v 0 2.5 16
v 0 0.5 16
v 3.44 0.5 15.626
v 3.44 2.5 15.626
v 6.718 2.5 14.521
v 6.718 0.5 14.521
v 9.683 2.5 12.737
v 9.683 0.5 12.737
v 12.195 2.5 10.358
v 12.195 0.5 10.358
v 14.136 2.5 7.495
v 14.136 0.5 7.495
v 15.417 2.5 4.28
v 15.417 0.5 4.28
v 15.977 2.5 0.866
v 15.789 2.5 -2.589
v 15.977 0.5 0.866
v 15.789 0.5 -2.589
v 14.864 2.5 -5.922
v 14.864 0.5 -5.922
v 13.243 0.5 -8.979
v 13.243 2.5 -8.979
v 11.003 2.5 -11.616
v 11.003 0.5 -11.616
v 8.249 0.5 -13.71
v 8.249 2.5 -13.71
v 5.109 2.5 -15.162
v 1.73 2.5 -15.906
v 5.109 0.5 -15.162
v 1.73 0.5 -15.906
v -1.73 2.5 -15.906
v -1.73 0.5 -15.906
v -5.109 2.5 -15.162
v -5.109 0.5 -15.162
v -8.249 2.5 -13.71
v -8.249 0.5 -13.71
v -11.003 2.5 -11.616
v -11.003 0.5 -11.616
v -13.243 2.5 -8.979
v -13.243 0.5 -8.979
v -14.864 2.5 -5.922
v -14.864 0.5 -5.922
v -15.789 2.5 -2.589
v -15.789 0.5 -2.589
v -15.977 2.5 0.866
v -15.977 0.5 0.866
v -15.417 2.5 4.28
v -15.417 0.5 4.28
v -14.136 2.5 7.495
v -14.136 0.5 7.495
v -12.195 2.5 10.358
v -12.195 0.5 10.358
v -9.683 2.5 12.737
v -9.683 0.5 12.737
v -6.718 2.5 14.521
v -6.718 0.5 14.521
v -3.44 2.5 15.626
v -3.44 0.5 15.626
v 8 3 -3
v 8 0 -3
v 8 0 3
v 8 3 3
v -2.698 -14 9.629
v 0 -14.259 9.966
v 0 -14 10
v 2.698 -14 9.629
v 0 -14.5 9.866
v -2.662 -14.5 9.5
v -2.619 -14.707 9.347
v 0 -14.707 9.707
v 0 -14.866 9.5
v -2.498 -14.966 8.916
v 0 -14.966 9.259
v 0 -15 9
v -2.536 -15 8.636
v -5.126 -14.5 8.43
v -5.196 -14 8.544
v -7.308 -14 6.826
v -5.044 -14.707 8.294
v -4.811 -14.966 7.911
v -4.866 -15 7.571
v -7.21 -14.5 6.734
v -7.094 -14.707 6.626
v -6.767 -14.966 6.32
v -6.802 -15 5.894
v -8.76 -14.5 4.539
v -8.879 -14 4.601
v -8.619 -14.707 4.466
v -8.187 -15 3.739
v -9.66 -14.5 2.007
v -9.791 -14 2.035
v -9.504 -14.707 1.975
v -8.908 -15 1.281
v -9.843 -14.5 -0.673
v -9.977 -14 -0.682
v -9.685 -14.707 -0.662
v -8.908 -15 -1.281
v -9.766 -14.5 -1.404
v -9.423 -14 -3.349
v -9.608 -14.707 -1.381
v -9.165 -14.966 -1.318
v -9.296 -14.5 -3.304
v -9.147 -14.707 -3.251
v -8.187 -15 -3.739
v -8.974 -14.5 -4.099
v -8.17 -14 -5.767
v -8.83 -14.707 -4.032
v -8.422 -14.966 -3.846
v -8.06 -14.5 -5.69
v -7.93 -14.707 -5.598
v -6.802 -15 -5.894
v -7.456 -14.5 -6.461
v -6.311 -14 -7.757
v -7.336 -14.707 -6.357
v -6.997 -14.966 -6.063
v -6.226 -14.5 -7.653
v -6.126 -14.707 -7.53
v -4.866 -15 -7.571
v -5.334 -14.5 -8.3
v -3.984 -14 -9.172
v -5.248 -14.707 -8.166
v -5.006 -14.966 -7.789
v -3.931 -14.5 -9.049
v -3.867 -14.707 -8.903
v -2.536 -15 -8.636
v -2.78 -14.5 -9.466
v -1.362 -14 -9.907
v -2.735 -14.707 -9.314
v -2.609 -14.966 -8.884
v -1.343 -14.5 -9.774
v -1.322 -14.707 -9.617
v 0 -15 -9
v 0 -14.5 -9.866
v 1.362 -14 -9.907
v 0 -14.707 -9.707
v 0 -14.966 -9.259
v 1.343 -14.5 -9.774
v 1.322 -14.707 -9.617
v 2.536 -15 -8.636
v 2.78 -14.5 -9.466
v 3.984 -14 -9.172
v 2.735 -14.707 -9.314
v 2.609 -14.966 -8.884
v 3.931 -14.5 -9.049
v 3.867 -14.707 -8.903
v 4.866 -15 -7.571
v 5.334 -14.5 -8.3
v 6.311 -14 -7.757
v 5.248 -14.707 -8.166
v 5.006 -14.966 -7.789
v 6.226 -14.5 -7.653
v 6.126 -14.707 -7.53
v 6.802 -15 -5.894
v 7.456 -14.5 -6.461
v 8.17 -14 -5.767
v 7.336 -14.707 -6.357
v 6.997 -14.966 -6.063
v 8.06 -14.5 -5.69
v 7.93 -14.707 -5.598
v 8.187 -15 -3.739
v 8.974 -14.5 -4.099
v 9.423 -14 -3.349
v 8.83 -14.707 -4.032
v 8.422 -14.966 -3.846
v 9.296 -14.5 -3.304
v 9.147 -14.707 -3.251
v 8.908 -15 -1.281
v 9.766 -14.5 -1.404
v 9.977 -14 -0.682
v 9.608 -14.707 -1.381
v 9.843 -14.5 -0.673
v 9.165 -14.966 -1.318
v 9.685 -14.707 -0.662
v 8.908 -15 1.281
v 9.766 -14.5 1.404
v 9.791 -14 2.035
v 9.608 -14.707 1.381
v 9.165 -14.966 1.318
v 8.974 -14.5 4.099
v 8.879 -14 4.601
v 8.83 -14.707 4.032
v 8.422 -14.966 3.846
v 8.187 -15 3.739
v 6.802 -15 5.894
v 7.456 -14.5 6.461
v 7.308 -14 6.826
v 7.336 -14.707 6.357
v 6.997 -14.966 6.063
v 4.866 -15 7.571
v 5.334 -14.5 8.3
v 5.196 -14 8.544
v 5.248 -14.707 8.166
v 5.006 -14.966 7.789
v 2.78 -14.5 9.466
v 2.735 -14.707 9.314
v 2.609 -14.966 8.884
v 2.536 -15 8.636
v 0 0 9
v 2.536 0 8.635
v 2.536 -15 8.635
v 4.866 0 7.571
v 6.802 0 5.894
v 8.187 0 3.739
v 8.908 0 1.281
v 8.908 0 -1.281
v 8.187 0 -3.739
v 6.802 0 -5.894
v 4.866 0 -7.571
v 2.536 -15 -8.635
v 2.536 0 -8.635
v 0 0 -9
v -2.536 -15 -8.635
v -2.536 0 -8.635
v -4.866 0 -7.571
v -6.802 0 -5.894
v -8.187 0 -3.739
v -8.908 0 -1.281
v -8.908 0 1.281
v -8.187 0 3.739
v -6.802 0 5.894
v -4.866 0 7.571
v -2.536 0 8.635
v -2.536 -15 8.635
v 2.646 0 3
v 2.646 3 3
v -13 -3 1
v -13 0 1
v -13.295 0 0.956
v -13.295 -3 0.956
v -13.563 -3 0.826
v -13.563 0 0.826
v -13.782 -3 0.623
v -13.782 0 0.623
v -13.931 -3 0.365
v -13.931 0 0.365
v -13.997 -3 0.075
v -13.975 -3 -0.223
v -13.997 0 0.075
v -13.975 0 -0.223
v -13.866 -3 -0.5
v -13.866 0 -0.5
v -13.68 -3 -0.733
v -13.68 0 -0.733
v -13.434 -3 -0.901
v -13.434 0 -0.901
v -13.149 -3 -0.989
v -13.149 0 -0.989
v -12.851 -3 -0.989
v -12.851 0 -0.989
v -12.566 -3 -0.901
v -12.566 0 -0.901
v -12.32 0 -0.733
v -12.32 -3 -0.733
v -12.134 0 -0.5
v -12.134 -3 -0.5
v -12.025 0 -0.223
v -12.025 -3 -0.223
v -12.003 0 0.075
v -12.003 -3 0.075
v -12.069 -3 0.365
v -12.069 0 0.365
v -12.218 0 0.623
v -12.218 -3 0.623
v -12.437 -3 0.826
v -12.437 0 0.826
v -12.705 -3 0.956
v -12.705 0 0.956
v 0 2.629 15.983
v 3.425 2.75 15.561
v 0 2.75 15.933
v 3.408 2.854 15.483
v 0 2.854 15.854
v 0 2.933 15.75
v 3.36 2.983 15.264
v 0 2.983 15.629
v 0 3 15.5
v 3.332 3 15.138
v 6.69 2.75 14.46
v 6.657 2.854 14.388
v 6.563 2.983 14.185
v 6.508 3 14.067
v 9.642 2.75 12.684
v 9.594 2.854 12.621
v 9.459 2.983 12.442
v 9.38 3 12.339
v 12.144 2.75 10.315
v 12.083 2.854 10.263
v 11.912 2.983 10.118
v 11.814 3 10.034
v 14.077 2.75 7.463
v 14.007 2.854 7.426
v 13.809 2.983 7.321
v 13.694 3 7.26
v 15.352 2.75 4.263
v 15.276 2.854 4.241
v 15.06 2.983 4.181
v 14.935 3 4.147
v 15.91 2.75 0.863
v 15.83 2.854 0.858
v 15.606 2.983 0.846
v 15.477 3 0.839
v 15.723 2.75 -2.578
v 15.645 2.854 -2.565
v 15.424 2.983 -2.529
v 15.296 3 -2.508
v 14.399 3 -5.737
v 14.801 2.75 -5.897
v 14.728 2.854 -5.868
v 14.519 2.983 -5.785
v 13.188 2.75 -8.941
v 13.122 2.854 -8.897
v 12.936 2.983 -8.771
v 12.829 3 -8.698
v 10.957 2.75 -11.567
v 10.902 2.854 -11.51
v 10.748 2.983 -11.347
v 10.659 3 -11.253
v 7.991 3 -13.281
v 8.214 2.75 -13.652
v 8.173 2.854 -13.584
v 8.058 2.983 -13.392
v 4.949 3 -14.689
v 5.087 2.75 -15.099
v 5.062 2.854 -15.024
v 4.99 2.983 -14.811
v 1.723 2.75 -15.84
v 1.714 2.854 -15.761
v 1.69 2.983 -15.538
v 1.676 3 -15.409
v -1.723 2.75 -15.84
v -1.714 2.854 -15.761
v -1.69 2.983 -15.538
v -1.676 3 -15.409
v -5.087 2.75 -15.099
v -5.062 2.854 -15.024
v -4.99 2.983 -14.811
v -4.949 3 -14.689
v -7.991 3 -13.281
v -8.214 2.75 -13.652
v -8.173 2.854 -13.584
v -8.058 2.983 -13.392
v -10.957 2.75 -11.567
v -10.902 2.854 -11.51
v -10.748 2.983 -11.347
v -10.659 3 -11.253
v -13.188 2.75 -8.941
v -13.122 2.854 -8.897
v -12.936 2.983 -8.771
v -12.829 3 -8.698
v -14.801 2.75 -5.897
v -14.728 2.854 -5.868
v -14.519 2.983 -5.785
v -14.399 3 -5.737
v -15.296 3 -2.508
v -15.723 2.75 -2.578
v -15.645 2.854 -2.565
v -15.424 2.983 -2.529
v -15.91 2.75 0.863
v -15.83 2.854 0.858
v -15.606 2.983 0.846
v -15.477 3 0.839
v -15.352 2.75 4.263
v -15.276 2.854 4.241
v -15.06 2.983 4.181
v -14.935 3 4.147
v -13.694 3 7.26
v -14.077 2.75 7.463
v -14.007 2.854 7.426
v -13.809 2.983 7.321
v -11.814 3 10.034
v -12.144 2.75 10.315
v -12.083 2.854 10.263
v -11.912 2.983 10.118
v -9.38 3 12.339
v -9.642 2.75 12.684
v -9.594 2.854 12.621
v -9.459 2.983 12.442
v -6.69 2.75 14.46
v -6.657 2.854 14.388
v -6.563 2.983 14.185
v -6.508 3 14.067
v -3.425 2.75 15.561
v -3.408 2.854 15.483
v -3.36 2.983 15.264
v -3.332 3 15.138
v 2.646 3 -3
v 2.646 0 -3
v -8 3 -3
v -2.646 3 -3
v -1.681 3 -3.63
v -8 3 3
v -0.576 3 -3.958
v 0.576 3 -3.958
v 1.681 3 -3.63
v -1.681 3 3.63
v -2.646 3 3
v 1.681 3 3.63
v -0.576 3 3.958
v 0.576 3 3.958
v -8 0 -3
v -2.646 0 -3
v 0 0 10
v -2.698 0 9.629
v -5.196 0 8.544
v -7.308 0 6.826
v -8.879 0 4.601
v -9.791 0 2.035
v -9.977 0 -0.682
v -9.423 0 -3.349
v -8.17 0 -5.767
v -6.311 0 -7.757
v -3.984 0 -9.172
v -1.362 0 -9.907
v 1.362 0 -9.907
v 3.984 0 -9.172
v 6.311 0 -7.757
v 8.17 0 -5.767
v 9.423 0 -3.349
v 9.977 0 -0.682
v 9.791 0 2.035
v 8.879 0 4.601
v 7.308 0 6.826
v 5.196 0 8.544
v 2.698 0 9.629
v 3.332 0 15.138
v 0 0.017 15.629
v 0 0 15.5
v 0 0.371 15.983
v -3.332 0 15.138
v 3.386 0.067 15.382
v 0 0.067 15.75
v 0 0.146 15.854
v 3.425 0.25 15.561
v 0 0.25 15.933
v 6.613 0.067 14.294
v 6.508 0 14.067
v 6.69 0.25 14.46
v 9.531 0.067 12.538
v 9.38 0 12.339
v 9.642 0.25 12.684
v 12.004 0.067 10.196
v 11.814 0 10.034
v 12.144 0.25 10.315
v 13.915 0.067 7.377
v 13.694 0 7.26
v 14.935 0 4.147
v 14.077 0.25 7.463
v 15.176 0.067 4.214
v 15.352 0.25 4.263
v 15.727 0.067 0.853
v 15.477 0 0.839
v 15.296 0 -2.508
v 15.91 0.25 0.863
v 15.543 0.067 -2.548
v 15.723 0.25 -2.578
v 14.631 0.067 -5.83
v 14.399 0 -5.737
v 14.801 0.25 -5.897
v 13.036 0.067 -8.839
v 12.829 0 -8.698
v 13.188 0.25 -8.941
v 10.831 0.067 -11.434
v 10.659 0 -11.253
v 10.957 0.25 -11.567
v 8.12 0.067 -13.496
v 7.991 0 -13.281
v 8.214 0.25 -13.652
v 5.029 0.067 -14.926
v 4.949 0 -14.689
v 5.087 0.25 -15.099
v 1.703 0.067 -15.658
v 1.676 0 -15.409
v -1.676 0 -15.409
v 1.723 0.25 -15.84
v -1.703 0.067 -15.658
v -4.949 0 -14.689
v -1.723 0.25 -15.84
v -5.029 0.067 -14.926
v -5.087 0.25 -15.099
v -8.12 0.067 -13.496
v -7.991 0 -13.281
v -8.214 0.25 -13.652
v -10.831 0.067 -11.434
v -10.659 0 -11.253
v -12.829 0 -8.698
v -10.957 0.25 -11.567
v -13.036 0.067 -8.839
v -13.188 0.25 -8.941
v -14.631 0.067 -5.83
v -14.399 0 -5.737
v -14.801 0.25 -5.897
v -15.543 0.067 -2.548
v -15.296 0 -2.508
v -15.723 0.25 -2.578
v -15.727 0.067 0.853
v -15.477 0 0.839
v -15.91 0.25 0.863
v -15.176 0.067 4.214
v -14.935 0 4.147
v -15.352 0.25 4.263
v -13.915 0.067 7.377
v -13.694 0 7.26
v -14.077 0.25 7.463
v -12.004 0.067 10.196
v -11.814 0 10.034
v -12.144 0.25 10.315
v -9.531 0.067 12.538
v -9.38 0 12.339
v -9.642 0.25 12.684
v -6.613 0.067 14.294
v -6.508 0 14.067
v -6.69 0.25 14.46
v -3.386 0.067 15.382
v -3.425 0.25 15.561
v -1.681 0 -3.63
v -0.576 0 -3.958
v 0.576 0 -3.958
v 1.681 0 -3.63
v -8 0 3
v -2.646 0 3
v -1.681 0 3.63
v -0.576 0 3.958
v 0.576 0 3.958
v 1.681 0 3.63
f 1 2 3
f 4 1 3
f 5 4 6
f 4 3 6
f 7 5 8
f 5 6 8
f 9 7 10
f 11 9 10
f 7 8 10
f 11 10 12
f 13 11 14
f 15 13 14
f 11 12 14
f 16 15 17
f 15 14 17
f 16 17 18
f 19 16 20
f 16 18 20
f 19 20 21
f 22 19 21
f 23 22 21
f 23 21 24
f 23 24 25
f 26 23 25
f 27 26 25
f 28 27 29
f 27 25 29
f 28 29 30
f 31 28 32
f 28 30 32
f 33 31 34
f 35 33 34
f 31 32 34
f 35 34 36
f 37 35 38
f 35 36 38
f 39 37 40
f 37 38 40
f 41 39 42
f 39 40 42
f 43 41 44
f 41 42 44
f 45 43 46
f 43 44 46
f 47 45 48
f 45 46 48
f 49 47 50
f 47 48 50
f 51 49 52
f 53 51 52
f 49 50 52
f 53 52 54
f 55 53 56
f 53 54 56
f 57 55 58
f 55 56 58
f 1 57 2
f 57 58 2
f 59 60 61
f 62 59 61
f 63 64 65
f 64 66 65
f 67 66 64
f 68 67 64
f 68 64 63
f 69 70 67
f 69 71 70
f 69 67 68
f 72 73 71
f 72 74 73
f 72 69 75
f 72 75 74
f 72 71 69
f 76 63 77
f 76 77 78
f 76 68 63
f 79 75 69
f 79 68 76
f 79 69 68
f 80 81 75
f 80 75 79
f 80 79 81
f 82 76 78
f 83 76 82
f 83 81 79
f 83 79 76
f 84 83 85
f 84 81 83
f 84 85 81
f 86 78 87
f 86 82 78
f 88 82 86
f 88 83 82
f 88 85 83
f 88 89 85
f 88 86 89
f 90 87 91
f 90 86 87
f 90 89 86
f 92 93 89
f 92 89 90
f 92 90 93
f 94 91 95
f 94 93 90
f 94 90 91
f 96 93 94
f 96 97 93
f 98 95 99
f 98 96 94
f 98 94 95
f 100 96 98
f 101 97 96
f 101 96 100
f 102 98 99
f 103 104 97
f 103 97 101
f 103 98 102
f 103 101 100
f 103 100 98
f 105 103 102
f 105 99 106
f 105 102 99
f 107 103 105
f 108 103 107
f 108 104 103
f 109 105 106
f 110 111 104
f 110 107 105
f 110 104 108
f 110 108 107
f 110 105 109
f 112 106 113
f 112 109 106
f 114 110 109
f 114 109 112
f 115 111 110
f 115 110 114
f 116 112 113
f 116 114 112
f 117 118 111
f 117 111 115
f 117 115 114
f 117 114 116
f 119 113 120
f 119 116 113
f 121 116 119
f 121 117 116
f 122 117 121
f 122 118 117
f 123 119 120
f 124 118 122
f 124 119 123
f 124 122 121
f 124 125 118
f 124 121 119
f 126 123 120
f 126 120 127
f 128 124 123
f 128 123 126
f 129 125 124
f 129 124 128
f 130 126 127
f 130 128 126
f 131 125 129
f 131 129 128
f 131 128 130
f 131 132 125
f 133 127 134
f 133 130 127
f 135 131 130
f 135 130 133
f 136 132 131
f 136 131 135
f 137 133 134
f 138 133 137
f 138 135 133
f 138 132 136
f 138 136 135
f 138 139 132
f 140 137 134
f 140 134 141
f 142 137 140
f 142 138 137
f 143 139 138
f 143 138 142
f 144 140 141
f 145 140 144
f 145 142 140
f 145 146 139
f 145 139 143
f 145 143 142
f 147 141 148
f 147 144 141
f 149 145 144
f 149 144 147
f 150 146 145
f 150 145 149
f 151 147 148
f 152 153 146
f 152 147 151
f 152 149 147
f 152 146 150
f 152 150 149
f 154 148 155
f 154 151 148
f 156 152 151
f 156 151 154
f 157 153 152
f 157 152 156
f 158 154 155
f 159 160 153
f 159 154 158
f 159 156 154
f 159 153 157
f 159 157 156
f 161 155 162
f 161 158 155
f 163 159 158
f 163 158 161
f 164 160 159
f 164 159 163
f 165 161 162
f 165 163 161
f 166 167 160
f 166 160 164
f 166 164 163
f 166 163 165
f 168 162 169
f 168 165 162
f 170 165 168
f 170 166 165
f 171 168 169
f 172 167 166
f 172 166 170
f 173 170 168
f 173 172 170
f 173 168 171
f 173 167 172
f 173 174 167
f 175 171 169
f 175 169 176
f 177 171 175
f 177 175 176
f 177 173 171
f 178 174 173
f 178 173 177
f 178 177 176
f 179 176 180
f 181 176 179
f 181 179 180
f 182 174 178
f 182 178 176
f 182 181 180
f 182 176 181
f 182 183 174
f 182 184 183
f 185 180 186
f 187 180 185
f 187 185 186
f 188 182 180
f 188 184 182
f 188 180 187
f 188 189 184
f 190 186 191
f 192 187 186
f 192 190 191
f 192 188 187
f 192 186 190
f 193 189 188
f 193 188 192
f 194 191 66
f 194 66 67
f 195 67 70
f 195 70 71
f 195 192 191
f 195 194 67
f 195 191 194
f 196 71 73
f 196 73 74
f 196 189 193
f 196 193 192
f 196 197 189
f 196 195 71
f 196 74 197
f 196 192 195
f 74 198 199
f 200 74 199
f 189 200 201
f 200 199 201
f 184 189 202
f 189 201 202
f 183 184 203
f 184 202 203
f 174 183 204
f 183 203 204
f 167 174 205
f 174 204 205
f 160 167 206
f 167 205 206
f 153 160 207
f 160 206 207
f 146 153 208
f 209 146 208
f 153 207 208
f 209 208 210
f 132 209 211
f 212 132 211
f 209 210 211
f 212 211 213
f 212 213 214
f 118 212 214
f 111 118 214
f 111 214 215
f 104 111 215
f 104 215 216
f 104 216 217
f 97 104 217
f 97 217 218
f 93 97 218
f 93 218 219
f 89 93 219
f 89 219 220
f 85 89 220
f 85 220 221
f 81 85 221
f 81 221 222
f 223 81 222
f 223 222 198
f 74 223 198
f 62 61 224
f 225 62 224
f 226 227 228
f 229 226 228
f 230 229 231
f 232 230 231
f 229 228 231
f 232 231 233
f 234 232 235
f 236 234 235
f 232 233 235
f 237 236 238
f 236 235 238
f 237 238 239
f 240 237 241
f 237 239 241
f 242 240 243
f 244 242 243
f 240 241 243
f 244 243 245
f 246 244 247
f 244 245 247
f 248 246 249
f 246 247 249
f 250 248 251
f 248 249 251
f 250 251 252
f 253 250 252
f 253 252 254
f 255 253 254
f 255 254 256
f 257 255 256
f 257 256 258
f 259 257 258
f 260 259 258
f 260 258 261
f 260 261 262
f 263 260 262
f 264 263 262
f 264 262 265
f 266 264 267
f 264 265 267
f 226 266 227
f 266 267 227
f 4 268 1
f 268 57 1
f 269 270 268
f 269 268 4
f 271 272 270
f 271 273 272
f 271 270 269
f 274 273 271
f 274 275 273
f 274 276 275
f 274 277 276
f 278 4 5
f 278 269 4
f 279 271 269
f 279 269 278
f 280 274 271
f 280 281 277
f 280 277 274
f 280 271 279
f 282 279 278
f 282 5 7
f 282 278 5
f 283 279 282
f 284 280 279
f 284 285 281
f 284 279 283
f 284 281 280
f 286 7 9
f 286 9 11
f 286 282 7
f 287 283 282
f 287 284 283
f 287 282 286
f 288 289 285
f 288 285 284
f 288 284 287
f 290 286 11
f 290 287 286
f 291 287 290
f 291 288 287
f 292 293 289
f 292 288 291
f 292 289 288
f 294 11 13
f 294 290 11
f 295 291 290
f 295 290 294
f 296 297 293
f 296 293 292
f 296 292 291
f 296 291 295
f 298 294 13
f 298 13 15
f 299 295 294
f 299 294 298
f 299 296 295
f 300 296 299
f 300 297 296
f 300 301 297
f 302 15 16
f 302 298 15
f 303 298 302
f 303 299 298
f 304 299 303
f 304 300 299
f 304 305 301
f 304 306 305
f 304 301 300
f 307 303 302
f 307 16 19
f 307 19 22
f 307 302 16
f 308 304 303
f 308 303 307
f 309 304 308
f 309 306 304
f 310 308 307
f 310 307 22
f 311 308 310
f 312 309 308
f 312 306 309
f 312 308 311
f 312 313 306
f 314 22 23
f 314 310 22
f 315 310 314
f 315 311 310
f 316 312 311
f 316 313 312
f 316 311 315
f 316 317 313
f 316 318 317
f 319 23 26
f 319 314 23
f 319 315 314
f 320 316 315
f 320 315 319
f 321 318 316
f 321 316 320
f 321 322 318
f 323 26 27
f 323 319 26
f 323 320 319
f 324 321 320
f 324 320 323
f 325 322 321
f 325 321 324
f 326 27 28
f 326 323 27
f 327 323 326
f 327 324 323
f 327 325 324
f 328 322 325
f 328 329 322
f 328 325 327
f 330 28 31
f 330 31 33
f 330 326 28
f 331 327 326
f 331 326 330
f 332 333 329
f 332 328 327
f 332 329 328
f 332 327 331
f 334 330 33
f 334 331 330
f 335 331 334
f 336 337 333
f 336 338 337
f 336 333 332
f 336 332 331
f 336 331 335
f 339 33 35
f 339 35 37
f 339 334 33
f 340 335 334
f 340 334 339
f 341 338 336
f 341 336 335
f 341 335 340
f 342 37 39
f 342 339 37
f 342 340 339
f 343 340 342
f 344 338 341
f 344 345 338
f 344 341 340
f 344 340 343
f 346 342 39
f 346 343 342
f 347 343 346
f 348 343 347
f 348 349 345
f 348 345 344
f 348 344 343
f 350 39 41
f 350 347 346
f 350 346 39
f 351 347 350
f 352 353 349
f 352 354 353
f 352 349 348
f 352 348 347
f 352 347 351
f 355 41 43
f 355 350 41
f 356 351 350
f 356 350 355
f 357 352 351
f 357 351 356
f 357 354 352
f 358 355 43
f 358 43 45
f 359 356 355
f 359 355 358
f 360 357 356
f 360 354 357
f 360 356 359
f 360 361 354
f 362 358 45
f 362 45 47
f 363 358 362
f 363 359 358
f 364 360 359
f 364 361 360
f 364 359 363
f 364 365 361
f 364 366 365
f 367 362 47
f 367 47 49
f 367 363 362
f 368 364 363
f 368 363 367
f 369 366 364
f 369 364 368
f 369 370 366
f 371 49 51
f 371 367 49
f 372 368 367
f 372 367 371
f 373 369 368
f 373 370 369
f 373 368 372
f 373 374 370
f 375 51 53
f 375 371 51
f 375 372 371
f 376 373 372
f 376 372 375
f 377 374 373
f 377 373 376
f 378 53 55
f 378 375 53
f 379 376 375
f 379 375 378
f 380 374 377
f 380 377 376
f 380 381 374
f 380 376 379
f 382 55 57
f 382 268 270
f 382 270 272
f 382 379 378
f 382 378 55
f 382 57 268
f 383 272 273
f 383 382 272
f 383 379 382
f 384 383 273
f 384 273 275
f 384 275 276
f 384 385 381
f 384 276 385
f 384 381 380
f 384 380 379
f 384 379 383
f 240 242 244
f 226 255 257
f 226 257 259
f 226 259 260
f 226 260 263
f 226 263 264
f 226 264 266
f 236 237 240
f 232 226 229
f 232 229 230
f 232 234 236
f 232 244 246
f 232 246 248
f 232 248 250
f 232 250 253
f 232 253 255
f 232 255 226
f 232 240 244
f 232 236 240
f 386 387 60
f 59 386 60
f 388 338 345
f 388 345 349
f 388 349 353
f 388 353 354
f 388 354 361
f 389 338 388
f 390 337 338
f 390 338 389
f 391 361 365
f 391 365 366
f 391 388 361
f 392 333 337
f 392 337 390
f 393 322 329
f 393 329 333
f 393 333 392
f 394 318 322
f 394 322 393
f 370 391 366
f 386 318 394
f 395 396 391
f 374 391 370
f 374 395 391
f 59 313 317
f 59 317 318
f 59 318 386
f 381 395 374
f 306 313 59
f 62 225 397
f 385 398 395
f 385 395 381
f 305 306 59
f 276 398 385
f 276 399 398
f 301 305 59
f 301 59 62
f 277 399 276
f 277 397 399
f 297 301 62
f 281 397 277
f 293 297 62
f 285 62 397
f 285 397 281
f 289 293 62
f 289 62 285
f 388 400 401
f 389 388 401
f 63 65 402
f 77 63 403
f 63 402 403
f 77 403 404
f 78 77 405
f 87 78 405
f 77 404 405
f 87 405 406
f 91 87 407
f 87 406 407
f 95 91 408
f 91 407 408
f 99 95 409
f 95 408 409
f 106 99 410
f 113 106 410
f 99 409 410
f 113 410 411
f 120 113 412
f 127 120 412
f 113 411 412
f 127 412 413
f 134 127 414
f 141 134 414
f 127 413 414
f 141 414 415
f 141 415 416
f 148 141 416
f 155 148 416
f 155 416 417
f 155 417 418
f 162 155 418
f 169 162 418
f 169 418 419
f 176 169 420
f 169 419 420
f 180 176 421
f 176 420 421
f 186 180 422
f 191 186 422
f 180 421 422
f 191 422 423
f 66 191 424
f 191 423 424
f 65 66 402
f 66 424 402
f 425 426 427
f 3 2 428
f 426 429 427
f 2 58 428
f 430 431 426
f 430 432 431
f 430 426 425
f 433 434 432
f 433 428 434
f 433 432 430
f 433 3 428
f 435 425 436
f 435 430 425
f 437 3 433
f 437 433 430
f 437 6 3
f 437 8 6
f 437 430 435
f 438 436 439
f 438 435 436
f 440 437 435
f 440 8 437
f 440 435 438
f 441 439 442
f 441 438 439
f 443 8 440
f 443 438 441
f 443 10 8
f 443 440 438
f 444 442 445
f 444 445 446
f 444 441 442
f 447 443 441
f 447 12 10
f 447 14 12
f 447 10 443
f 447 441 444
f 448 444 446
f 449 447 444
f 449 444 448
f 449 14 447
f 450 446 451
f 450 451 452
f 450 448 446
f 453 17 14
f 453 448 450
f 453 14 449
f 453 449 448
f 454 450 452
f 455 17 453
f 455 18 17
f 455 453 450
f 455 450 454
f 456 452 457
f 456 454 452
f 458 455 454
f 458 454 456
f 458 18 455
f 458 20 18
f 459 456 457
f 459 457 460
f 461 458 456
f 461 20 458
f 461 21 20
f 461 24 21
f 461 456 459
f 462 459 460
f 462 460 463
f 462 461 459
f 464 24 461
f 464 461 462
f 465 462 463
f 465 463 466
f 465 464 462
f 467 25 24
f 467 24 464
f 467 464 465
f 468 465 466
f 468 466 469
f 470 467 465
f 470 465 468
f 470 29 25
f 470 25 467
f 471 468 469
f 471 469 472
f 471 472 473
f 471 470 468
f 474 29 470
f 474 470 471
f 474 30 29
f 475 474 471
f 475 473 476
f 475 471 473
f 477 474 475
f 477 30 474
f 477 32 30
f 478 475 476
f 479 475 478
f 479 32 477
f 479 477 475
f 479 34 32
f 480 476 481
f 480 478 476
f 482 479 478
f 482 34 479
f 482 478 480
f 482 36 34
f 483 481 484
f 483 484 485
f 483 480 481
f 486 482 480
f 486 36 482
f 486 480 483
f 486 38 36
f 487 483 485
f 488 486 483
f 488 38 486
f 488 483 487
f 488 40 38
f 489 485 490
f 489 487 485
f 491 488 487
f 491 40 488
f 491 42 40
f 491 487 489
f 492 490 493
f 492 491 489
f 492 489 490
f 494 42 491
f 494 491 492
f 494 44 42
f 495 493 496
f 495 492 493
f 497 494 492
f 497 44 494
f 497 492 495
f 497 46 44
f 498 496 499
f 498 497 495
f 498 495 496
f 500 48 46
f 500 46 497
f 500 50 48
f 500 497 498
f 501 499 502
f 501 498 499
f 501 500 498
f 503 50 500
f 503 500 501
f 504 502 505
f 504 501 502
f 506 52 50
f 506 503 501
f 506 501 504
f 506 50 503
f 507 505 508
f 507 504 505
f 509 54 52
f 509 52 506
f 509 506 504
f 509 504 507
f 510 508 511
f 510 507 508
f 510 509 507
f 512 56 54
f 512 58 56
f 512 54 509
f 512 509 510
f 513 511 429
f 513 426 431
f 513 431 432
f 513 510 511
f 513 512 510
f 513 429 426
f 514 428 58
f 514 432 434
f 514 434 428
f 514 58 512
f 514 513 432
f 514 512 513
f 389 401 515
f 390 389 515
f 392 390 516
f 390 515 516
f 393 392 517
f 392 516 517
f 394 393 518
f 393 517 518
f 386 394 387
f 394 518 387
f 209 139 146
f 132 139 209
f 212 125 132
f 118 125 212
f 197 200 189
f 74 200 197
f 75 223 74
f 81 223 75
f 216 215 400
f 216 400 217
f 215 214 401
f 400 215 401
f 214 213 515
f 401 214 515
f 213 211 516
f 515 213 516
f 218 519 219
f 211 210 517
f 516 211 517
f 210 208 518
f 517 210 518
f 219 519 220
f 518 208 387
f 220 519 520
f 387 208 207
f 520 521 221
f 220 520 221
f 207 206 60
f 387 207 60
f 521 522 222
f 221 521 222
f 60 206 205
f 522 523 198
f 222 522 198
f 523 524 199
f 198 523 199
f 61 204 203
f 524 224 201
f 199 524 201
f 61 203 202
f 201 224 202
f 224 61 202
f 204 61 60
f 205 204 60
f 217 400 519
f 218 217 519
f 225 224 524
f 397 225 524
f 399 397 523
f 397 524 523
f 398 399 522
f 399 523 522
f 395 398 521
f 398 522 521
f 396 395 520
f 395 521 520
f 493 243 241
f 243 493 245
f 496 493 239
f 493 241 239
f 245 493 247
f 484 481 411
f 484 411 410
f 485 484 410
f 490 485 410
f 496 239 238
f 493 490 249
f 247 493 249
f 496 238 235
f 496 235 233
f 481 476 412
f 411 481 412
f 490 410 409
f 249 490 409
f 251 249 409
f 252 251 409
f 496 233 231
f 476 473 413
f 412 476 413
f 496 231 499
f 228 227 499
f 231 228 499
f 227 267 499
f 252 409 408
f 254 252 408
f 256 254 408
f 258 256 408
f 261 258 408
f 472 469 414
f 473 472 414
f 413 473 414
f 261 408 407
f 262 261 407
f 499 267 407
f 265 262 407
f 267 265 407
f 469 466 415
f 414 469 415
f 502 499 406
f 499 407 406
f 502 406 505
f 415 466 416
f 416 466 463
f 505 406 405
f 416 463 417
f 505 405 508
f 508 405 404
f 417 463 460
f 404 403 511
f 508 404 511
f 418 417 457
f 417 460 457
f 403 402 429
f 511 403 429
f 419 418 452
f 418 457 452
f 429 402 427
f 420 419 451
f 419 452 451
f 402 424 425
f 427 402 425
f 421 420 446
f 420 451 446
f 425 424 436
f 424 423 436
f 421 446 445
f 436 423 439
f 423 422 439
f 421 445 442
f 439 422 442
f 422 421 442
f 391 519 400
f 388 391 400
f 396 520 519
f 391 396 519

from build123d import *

# Parameters (mm, degrees)
SKETCH1_R           = 16
BOSS_EXTRUDE1_DEPTH = 3
SKETCH3_R           = 1
BOSS_EXTRUDE2_DEPTH = 3
SKETCH4_R           = 10
BOSS_EXTRUDE3_DEPTH = 15
CUT_EXTRUDE1_REACH  = 29.148
SKETCH5_R           = 9
FILLET1_R           = 1
FILLET2_R           = 0.5


with BuildPart() as part:
    # Sketch1 → Boss-Extrude1 (new body)
    with BuildSketch(Plane(origin=(0, 0, 0), x_dir=(1, 0, 0), z_dir=(0, 1, 0))):
        with Locations(Location((0, 0, 0), (0, 0, 270))):
            Circle(SKETCH1_R)
        with BuildLine():
            Line((2.645751311, 3), (8, 3))
            Line((8, 3), (8, -3))
            Line((8, -3), (2.645751311, -3))
            ThreePointArc((2.645751311, -3), (0, -4), (-2.645751311, -3))
            Line((-2.645751311, -3), (-8, -3))
            Line((-8, -3), (-8, 3))
            Line((-8, 3), (-2.645751311, 3))
            ThreePointArc((-2.645751311, 3), (0, 4), (2.645751311, 3))
        make_face(mode=Mode.SUBTRACT)
    extrude(amount=BOSS_EXTRUDE1_DEPTH)

    # Sketch3 → Boss-Extrude2 (add)
    with BuildSketch(Plane.XZ):
        with Locations(Location((-13, 0, 0), (0, 0, 90))):
            Circle(SKETCH3_R)
    extrude(amount=BOSS_EXTRUDE2_DEPTH)

    # Sketch4 → Boss-Extrude3 (add)
    with BuildSketch(Plane.XZ):
        with Locations(Location((0, 0, 0), (0, 0, 90))):
            Circle(SKETCH4_R)
    extrude(amount=BOSS_EXTRUDE3_DEPTH)

    # Sketch5 → Cut-Extrude1 (cut, up to next)
    with BuildSketch(Plane(origin=(0, 0, 0), x_dir=(1, 0, 0), z_dir=(0, 1, 0)), mode=Mode.PRIVATE) as cut_extrude1_sk1:
        with Locations(Location((0, 0, 0), (0, 0, 270))):
            Circle(SKETCH5_R)
    cut_extrude1_tool1 = extrude(cut_extrude1_sk1.sketch, amount=-CUT_EXTRUDE1_REACH, mode=Mode.PRIVATE) & part.part
    add(cut_extrude1_tool1.solids().sort_by_distance((0, 0, 0))[0], mode=Mode.SUBTRACT)

    # Fillet1
    fillet1_edges = [part.edges().sort_by_distance(p)[0] for p in [
        (0, -15, -10),
    ]]
    fillet(fillet1_edges, radius=FILLET1_R - 0.0001)  # a hair under: the kernel refuses the full size

    # Fillet2
    fillet2_edges = [part.edges().sort_by_distance(p)[0] for p in [
        (0, 0, -16),
        (0, 3, -16),
    ]]
    fillet(fillet2_edges, radius=FILLET2_R)


solid = part.part
